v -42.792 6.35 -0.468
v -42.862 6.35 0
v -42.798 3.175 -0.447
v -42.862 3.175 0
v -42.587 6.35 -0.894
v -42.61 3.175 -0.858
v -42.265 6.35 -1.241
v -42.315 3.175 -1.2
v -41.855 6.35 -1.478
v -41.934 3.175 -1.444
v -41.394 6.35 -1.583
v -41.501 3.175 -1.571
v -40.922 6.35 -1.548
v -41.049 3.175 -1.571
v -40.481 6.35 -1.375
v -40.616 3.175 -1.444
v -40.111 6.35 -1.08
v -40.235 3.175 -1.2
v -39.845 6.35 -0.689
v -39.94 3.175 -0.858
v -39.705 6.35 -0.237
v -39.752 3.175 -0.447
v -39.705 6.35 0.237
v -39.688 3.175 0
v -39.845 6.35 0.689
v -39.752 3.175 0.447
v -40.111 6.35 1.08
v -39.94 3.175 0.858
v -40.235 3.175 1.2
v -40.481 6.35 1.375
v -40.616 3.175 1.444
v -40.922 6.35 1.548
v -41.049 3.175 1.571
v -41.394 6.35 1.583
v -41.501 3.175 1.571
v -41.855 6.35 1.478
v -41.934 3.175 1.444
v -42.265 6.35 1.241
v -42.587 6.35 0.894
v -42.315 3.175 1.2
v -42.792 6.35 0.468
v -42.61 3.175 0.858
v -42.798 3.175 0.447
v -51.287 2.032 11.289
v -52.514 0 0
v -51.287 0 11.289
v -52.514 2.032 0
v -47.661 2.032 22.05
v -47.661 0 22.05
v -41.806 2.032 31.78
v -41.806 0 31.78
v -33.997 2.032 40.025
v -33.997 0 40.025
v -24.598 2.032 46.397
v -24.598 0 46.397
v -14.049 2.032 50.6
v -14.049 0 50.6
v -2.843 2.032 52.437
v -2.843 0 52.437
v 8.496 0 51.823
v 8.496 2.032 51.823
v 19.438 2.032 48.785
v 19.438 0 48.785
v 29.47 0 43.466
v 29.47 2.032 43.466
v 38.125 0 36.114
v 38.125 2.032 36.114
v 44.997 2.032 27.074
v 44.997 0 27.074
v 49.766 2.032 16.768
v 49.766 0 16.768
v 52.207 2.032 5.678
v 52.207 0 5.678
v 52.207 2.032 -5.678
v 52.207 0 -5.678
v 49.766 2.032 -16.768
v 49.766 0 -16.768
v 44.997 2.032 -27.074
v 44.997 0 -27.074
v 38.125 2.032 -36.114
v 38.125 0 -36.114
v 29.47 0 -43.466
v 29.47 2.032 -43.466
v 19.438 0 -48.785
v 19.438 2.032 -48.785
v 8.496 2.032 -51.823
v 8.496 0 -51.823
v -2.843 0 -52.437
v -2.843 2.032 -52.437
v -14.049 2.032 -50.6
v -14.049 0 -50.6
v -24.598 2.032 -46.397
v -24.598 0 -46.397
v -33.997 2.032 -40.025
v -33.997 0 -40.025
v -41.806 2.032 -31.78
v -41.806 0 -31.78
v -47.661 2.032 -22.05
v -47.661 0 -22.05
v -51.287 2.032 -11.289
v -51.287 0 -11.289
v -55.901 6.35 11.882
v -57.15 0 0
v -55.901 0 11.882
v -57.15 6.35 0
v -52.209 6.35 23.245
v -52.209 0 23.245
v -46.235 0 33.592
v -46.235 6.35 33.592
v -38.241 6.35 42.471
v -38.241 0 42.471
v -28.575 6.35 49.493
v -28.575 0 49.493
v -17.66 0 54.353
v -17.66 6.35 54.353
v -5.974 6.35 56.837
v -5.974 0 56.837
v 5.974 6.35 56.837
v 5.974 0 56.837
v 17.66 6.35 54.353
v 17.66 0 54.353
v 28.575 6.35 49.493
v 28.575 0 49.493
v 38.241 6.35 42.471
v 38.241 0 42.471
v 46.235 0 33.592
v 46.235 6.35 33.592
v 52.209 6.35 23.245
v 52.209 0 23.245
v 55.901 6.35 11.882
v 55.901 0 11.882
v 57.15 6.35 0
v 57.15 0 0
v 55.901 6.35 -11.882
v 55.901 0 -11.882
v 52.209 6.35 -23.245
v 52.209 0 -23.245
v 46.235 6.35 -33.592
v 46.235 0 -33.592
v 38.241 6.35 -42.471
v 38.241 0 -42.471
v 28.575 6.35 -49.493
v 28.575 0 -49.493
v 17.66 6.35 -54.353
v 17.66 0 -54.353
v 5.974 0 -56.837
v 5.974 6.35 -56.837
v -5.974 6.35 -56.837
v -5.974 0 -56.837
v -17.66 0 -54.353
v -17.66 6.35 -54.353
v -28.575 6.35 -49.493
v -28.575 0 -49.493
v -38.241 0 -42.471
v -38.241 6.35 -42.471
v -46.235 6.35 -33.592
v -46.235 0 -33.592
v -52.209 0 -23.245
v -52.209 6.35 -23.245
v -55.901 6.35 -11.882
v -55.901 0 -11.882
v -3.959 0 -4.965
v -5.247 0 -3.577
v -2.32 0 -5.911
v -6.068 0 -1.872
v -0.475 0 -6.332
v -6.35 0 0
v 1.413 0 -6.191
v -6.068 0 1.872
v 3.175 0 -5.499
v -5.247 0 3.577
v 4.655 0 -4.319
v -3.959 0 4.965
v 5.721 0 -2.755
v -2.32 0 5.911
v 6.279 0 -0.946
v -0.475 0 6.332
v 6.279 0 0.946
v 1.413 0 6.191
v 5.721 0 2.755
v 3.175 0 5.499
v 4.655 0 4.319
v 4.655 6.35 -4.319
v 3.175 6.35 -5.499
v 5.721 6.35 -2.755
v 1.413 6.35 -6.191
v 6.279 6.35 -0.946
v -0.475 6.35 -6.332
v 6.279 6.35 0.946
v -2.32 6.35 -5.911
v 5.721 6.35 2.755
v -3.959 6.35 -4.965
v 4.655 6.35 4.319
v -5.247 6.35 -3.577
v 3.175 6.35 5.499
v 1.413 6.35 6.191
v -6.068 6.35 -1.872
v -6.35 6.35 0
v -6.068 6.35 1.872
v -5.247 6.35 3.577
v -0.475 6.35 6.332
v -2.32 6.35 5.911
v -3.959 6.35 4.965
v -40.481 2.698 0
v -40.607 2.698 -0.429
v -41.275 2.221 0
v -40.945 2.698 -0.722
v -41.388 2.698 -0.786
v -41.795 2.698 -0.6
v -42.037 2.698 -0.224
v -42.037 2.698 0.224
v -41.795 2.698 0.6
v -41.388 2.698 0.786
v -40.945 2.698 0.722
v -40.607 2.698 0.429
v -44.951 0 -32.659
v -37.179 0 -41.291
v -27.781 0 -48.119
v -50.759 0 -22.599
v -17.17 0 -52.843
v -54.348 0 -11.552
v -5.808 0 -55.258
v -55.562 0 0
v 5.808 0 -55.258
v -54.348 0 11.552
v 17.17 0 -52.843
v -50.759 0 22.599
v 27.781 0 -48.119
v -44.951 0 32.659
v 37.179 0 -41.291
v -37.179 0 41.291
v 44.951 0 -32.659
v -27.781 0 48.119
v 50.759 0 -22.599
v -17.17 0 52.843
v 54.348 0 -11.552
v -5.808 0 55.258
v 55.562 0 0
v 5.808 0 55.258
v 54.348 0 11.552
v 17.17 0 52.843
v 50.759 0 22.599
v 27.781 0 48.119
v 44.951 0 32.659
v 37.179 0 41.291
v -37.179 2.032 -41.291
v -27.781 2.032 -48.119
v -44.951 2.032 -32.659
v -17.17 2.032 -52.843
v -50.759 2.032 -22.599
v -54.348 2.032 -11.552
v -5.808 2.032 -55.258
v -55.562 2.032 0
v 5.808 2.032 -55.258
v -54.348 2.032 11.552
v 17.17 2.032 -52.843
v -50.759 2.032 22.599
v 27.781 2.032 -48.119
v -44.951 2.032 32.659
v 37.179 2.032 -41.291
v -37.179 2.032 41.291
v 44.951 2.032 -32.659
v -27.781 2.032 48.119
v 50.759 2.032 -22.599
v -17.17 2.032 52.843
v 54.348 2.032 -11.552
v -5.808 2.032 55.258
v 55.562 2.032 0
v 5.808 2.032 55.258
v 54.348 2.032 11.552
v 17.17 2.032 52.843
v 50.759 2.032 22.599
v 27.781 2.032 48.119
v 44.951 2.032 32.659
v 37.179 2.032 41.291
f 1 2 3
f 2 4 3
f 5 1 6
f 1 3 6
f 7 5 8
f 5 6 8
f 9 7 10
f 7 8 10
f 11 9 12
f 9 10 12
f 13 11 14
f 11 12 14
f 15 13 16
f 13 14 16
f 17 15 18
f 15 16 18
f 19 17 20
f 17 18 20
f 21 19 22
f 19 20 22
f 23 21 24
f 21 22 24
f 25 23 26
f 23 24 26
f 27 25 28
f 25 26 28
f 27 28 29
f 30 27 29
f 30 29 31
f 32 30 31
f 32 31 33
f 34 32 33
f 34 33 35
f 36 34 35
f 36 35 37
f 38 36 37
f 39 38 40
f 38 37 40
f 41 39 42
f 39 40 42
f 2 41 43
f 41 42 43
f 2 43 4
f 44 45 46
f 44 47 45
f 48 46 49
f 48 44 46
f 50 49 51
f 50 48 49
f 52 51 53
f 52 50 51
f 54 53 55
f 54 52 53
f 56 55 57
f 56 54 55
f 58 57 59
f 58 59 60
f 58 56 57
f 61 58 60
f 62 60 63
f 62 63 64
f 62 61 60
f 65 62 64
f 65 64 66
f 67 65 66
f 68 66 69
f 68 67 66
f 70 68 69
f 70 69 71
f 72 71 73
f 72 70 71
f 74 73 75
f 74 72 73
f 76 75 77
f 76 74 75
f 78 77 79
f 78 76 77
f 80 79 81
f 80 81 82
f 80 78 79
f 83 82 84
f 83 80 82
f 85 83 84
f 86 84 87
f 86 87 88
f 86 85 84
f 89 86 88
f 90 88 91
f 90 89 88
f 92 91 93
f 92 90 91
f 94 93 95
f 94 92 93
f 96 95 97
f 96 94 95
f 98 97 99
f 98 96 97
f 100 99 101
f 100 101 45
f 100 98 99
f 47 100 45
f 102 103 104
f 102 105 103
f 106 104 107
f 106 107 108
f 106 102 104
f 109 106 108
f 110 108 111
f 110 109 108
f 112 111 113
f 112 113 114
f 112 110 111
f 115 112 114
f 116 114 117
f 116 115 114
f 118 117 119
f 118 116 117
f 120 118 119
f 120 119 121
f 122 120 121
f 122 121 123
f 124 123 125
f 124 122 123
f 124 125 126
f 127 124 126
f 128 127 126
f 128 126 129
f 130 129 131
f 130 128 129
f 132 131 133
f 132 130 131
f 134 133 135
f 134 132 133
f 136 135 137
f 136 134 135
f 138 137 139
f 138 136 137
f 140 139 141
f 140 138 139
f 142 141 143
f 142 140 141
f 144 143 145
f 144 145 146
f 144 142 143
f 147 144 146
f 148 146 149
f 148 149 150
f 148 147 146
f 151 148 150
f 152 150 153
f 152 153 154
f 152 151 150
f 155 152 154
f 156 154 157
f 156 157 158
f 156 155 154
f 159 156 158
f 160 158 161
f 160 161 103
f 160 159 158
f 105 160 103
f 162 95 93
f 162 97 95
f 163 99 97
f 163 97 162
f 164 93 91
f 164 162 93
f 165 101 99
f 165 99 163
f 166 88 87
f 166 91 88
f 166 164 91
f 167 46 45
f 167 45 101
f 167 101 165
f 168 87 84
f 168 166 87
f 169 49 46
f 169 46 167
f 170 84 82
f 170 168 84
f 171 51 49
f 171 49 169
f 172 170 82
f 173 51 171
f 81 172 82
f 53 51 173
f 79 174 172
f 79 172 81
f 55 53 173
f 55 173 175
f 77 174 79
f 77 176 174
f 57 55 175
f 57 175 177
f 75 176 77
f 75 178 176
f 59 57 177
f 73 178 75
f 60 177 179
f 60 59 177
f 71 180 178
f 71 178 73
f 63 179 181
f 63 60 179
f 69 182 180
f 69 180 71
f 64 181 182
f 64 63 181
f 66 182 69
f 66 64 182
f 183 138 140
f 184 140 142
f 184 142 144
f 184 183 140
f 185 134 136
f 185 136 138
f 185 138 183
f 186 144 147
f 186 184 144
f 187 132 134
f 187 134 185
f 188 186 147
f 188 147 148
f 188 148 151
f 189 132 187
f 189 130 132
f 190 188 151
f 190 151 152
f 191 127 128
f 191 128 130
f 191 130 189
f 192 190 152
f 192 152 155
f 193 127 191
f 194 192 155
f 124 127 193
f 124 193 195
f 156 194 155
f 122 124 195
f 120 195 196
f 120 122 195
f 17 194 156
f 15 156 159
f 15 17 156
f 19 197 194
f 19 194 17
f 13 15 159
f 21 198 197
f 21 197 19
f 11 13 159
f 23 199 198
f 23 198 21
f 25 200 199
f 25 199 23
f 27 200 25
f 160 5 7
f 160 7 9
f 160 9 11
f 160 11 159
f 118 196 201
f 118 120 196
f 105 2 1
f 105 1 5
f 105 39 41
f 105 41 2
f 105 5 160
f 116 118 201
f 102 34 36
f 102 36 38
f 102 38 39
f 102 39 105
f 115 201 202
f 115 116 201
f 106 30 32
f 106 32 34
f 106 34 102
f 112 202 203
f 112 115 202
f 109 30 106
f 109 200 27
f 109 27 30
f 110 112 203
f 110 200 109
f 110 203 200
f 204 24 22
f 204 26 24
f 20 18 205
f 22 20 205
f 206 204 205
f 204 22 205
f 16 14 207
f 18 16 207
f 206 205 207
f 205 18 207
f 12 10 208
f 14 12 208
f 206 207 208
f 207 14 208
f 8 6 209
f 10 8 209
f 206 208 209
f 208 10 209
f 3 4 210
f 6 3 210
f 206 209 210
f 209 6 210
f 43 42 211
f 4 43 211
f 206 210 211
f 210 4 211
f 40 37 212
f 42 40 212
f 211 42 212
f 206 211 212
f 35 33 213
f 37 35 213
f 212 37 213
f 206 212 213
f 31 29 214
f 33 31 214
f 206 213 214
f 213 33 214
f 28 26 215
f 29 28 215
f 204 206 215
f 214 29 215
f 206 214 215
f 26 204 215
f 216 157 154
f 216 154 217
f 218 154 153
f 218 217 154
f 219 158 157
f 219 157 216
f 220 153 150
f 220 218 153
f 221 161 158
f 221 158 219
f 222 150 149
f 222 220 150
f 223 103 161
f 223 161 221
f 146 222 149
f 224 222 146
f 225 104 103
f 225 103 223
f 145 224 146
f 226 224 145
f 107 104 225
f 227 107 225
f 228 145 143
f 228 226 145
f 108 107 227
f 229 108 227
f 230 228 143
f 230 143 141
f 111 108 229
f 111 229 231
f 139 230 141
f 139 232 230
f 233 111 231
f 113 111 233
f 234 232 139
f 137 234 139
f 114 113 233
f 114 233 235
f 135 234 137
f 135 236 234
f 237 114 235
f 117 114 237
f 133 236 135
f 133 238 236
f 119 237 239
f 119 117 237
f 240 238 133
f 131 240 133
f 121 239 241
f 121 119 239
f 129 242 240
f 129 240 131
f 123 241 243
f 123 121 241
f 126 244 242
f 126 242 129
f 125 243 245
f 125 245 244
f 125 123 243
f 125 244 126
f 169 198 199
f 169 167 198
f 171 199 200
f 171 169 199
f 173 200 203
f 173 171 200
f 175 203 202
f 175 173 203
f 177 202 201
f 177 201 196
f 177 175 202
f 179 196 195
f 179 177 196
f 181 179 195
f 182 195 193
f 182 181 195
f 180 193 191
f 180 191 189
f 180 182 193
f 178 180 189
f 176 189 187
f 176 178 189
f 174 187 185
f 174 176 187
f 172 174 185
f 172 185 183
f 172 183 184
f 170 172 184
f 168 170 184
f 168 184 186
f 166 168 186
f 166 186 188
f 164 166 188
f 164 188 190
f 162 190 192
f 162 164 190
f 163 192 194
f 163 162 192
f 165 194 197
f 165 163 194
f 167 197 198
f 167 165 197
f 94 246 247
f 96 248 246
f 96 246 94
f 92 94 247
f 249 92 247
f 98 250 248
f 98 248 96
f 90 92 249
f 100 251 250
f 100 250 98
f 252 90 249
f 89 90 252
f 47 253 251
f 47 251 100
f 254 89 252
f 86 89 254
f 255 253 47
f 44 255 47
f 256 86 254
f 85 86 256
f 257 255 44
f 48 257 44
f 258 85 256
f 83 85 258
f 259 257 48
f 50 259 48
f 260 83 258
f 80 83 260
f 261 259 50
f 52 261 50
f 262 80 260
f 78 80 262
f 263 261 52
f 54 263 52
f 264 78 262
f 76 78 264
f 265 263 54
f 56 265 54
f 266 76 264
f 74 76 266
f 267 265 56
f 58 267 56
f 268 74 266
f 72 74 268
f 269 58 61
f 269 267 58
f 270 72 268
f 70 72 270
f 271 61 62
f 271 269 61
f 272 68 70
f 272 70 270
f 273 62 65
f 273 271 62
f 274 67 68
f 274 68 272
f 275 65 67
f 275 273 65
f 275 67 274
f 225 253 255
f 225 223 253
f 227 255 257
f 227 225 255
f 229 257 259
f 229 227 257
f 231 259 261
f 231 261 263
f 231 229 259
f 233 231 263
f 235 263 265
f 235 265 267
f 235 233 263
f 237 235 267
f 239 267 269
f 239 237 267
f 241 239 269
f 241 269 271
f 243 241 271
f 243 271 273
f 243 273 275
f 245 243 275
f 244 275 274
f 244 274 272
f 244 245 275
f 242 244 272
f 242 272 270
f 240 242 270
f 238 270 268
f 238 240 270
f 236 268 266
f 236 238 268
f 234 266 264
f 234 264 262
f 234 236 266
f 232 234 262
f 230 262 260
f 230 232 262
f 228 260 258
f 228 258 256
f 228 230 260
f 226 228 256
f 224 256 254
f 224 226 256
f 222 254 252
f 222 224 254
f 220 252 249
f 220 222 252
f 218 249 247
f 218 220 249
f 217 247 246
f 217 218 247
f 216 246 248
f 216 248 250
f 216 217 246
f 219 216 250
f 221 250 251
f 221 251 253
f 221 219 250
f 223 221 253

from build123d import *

# Parameters (mm, degrees)
F_1_8_0_125_DIAMETER_HOLE1_D     = 3.175
F_1_8_0_125_DIAMETER_HOLE1_DEPTH = 3.175
F_1_8_0_125_DIAMETER_HOLE1_TIP   = 0.953866233


with BuildPart() as part:
    # Sketch1 → Revolve1 (revolve)
    with BuildSketch(Plane.XY):
        Polygon((-6.35, 0), (-52.5145, 0), (-52.5145, 2.032), (-55.5625, 2.032), (-55.5625, 0), (-57.15, 0), (-57.15, 6.35), (-6.35, 6.35), align=None)
    revolve(axis=Axis((0, 0, 0), (0, 1, 0)))

    # 1/8 (0.125) Diameter Hole1
    with Locations(Plane(origin=(0, 6.35, 0), x_dir=(1, 0, 0), z_dir=(0, 1, 0))):
        with Locations((-41.275, 0)):
            Hole(F_1_8_0_125_DIAMETER_HOLE1_D / 2, depth=F_1_8_0_125_DIAMETER_HOLE1_DEPTH)
            with Locations((0, 0, -(F_1_8_0_125_DIAMETER_HOLE1_DEPTH + F_1_8_0_125_DIAMETER_HOLE1_TIP / 2))):  # 118° drill point
                Cone(0, F_1_8_0_125_DIAMETER_HOLE1_D / 2, F_1_8_0_125_DIAMETER_HOLE1_TIP, mode=Mode.SUBTRACT)


solid = part.part
